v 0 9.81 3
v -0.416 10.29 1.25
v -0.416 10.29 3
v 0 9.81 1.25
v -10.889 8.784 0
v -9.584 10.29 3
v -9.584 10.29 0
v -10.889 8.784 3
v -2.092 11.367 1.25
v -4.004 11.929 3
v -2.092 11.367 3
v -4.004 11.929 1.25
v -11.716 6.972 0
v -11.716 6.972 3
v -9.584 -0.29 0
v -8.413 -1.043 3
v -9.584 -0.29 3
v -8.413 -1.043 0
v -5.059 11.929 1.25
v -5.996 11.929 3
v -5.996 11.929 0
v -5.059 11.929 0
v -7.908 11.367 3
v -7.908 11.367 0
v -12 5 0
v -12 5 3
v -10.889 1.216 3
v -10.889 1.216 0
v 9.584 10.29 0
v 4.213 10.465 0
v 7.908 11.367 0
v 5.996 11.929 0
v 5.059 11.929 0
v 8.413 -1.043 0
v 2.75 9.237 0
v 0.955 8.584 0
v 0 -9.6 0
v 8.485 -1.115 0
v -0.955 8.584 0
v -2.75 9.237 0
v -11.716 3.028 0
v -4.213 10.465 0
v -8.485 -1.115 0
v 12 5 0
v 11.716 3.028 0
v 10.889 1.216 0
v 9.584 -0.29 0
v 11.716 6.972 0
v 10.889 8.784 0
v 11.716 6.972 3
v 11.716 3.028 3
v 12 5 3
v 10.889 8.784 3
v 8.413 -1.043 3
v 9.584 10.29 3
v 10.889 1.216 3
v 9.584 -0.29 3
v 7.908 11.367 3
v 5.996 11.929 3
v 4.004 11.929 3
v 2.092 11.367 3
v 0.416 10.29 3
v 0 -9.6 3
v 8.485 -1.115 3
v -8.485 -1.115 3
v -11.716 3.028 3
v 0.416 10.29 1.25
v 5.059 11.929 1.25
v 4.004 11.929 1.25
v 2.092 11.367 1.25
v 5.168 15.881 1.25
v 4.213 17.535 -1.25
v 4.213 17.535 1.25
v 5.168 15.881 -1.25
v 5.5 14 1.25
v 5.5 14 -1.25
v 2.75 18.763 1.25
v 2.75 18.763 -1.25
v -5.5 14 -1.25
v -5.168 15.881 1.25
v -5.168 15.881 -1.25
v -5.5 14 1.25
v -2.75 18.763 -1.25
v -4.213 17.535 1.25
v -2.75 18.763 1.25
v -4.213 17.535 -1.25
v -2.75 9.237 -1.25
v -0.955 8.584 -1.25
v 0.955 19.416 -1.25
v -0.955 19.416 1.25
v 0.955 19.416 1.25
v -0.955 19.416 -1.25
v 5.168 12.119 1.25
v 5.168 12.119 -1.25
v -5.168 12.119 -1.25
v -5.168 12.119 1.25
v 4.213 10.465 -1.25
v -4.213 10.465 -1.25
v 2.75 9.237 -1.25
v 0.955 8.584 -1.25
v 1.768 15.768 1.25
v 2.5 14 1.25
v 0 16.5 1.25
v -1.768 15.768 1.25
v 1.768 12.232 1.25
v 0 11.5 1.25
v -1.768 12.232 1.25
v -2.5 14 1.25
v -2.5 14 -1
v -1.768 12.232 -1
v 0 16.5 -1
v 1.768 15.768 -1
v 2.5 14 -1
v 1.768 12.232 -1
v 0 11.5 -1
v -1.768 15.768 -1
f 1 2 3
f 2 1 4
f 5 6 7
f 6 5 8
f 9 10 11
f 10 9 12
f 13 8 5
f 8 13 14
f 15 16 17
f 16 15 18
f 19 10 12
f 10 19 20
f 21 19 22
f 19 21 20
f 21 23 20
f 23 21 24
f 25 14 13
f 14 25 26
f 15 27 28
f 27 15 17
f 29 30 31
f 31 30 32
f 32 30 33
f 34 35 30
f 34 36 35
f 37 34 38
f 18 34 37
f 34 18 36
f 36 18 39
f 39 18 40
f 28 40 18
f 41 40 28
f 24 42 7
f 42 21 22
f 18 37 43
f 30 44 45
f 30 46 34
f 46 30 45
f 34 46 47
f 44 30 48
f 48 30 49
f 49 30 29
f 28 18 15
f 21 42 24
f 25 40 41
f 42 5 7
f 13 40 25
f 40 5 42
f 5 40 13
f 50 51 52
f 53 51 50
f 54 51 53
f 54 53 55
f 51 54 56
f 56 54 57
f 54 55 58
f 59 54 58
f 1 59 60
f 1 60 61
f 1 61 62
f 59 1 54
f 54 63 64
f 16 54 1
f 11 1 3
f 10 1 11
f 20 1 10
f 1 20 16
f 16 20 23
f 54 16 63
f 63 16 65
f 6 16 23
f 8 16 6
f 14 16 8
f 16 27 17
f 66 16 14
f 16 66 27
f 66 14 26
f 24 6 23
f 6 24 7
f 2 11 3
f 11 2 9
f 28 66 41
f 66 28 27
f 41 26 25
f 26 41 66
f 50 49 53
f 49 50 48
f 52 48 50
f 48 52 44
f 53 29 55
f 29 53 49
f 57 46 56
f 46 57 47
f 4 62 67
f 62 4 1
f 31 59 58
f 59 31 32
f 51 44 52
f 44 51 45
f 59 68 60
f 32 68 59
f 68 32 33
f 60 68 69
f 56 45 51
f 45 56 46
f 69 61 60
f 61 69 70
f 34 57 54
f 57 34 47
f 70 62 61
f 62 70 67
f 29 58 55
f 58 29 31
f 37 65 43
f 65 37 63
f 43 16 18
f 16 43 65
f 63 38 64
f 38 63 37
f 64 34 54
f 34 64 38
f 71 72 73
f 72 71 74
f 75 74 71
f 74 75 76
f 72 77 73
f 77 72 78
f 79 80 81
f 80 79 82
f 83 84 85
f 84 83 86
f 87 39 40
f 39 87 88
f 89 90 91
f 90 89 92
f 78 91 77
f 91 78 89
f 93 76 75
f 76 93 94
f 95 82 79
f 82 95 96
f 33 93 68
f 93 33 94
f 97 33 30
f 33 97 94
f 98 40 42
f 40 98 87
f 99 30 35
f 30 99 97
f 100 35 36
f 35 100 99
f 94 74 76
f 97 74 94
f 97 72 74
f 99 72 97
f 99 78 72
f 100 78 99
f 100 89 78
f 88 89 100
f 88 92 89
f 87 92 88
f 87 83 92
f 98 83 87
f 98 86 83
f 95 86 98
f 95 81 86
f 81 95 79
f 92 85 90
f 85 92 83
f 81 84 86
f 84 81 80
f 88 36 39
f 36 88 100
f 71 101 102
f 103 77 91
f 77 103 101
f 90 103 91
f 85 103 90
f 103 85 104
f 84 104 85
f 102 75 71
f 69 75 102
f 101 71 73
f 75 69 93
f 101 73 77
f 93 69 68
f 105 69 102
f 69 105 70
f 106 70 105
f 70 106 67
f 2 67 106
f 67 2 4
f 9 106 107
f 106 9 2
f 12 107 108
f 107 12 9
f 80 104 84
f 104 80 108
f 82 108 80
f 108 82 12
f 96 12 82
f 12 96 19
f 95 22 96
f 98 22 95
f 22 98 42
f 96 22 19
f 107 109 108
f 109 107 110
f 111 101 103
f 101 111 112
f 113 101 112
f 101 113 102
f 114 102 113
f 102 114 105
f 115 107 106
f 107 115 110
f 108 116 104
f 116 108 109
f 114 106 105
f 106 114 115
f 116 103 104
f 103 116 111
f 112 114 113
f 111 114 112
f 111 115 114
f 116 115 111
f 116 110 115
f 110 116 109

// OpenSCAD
altura = 3;

module coracao_base_cubo() {
    union() {
        // As duas metades superiores (arredondadas para formar o topo do coração)
        translate([-5, 5, 0]) cylinder(h = altura, r = 7);
        translate([5, 5, 0]) cylinder(h = altura, r = 7);
        
        // O Bico: um cubo rodado a 45 graus para criar uma ponta geométrica
        translate([0, -9.60, 0]) 
        rotate([0, 0, 45]) 
        cube([12, 12, altura], center = false);
    }
}

// Junta a forma com a argola física
union() {
    coracao_base_cubo();
    
    // Argola integrada no topo (também com aspeto robusto)
    translate([0, 14, 0]) 
    difference() {
        cylinder(h = 2.5, r = 5.5, center = true);
        translate([0, 0, -1]) cylinder(h = altura + 2, r = 2.5);
    }
}
